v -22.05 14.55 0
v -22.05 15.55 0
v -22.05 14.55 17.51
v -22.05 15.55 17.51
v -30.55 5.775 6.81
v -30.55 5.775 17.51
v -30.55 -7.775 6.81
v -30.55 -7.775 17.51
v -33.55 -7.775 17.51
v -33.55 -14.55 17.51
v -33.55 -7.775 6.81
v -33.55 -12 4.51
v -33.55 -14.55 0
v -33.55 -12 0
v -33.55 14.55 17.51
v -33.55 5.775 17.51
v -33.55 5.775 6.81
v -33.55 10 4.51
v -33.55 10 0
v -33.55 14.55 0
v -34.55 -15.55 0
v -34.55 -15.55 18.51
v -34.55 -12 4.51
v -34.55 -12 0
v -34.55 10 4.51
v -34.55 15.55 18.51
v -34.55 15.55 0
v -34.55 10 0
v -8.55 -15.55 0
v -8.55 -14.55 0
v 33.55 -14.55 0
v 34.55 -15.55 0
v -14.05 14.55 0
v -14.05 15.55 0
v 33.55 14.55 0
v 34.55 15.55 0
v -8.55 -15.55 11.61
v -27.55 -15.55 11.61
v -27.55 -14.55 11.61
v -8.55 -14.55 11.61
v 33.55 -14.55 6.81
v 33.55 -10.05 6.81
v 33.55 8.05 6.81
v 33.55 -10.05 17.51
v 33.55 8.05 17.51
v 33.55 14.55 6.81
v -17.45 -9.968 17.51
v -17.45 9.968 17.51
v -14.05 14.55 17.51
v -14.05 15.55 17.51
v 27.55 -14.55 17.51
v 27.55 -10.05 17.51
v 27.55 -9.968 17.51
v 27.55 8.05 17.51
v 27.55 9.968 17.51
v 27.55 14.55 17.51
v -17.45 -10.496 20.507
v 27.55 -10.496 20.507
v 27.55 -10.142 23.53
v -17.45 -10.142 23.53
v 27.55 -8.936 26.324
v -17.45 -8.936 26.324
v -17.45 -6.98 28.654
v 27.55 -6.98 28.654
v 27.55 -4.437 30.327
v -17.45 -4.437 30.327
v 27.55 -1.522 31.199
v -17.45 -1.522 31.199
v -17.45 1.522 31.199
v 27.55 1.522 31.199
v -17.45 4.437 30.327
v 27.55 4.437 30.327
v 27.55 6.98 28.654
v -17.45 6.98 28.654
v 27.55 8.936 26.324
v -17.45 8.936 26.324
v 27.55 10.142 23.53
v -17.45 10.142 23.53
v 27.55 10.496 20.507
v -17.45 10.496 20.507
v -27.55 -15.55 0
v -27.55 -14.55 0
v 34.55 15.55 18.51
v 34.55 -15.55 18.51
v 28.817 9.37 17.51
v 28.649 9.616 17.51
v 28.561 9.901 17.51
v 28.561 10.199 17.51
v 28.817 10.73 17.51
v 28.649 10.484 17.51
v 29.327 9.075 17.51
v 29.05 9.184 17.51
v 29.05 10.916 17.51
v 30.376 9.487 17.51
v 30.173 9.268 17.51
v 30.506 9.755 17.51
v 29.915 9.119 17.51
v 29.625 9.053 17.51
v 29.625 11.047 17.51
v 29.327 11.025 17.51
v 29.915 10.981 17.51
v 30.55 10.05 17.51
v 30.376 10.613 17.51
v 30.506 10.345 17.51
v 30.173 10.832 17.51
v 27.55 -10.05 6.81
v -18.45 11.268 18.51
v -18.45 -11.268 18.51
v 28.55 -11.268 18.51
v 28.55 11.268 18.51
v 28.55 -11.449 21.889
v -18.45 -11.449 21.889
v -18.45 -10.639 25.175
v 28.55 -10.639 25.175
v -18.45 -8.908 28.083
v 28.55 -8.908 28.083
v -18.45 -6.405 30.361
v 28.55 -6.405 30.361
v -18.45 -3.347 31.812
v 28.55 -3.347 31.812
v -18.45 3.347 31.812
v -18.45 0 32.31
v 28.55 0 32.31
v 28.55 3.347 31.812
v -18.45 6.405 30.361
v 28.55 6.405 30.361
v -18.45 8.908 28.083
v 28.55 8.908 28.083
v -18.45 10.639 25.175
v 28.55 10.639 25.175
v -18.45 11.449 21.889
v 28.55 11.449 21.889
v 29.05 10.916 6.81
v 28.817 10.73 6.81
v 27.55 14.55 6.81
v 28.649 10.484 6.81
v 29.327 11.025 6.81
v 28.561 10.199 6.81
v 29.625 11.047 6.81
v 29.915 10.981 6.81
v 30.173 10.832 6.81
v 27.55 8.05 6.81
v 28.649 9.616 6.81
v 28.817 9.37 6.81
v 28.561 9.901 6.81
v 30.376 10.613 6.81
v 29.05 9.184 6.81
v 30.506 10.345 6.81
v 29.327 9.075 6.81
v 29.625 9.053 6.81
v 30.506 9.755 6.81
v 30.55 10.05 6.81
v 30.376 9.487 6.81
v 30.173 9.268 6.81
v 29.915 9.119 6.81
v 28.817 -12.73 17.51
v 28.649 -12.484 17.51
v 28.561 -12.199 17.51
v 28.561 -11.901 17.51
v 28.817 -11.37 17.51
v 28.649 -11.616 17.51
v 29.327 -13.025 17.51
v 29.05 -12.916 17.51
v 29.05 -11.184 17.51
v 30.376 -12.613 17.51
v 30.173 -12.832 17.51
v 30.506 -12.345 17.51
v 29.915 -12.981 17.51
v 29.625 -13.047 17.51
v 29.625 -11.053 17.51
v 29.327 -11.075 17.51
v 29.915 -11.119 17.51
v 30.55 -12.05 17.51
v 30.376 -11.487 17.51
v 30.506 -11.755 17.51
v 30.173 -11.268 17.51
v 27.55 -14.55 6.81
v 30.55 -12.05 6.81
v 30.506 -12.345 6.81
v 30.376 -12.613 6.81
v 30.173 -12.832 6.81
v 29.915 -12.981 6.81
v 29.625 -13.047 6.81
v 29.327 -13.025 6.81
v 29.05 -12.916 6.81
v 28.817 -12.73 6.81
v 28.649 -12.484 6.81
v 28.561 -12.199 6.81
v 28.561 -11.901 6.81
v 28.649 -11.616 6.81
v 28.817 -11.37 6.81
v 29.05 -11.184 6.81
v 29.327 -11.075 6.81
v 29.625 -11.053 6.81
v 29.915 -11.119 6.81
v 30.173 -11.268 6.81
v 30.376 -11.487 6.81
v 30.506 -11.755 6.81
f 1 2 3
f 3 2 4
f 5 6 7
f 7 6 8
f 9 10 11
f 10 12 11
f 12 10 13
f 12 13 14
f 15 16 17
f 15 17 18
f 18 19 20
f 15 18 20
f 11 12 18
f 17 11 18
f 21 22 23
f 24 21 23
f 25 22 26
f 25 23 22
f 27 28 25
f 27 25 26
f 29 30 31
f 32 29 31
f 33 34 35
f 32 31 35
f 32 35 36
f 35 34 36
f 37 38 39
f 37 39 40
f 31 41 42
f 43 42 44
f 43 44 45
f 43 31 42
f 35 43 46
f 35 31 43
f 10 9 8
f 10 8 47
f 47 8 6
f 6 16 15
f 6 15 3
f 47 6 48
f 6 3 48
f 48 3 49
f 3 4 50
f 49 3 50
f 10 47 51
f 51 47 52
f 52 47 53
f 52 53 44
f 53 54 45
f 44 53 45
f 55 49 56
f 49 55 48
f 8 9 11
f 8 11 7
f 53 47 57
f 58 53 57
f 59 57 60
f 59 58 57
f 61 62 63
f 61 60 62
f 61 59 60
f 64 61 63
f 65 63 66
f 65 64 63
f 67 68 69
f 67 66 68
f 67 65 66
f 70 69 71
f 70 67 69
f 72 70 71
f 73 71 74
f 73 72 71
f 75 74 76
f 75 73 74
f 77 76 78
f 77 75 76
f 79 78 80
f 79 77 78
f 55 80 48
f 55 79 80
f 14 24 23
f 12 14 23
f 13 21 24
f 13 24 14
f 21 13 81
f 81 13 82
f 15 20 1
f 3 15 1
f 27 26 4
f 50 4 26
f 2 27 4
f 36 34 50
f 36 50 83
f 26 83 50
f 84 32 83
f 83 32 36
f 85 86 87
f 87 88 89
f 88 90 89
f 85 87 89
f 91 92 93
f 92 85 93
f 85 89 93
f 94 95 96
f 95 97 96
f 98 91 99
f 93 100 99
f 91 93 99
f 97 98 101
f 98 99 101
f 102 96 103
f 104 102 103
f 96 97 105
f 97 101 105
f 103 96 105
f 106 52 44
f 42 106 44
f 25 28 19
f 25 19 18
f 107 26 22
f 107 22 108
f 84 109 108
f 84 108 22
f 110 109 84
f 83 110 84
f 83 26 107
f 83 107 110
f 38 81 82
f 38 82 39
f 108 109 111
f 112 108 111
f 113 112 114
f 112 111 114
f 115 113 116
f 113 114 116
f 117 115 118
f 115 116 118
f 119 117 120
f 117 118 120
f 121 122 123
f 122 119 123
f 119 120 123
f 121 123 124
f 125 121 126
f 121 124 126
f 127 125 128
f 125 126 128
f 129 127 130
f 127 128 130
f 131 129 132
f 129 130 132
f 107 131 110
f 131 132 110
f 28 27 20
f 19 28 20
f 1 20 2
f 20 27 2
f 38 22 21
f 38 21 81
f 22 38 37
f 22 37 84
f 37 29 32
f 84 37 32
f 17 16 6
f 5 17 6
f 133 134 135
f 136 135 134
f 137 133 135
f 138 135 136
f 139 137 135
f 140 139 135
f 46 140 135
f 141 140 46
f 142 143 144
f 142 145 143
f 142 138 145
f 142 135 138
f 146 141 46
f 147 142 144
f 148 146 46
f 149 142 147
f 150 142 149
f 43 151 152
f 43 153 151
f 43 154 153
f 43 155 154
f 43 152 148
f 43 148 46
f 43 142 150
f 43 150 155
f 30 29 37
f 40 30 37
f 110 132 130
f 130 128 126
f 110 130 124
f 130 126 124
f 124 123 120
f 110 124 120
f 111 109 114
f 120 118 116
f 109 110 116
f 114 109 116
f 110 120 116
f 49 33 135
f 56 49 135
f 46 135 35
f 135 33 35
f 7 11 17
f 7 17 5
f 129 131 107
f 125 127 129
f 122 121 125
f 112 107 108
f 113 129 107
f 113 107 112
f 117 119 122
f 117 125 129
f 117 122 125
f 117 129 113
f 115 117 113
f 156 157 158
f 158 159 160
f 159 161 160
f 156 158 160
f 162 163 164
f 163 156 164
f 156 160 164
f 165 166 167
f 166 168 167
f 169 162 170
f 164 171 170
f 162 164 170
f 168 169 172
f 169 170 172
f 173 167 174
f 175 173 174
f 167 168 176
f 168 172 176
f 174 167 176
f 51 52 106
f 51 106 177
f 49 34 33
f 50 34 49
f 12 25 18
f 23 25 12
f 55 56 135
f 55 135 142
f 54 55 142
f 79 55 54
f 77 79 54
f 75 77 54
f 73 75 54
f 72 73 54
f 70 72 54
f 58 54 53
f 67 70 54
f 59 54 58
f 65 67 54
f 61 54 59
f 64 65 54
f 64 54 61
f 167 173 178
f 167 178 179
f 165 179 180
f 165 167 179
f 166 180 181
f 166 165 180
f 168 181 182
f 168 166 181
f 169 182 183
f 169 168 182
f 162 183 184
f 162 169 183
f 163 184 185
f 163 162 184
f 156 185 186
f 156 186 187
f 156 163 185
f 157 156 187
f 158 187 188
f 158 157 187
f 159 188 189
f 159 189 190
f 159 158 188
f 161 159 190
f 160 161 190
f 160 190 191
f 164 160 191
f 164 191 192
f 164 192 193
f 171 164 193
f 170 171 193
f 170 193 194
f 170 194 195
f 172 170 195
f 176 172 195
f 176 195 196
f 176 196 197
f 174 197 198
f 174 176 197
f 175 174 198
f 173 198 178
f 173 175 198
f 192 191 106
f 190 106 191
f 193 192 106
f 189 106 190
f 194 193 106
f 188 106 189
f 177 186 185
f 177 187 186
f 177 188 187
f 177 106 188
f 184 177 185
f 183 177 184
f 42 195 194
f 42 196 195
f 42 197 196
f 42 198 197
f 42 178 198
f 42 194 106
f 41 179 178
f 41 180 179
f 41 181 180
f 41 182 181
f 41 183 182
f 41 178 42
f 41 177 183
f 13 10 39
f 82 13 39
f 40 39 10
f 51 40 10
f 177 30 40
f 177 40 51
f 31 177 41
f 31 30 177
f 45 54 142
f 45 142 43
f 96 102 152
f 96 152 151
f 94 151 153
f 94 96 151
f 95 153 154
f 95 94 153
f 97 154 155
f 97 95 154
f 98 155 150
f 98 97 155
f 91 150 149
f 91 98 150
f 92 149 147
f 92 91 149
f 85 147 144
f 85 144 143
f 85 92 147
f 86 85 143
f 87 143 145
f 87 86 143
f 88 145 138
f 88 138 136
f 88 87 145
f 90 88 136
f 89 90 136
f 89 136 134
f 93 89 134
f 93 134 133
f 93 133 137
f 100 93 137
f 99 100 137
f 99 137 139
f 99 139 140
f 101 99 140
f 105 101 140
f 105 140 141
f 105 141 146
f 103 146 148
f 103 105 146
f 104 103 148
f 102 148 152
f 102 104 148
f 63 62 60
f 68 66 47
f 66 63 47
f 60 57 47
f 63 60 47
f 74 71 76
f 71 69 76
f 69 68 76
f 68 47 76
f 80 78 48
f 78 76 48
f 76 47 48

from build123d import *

# Parameters (mm, degrees)
SKETCH001_W       = 69.1
SKETCH001_H       = 31.1
PAD_DEPTH         = 18.51
CYLINDER_R        = 11.5
CYLINDER_DEPTH    = 47
CYLINDER001_R     = 10.5
CYLINDER001_DEPTH = 45
BOX_W             = 67.1
BOX_H             = 29.1
BOX_DEPTH         = 17.51
SKETCH003_W       = 6
SKETCH003_H       = 4.5
SKETCH003_R       = 1
SKETCH003_H_2     = 6.5
PAD001_DEPTH      = 10.7
SKETCH004_W       = 8
SKETCH004_H       = 17.51
POCKET_DEPTH      = 5
SKETCH005_W       = 3
SKETCH005_H       = 13.55
PAD002_DEPTH      = 10.7
SKETCH006_W       = 19
SKETCH006_H       = 11.61
POCKET001_DEPTH   = 5
SKETCH007_W       = 22
SKETCH007_H       = 4.51
POCKET002_DEPTH   = 5


with BuildPart() as part:
    # Sketch001 → Pad (new body)
    with BuildSketch(Plane.XY):
        Rectangle(SKETCH001_W, SKETCH001_H)
    extrude(amount=PAD_DEPTH)

    # Cylinder → Cylinder (join)
    with BuildSketch(Plane(origin=(28.55, 0, 20.81), x_dir=(0, -1, 0), z_dir=(-1, 0, 0))):
        Circle(CYLINDER_R)
    extrude(amount=CYLINDER_DEPTH)

    # Cylinder001 → Cylinder001 (cut)
    with BuildSketch(Plane(origin=(27.55, 0, 20.81), x_dir=(0, 1, 0), z_dir=(-1, 0, 0))):
        Circle(CYLINDER001_R)
    extrude(amount=CYLINDER001_DEPTH, mode=Mode.SUBTRACT)

    # Box → Box (cut)
    with BuildSketch(Plane(origin=(-33.55, -14.55, 0), x_dir=(1, 0, 0), z_dir=(0, 0, 1))):
        with Locations((33.55, 14.55)):
            Rectangle(BOX_W, BOX_H)
    extrude(amount=BOX_DEPTH, mode=Mode.SUBTRACT)

    # Sketch003 (on Face15 of Box) → Pad001 (join)
    with BuildSketch(Plane(origin=(-33.55, -14.55, 17.51), x_dir=(1, 0, 0), z_dir=(0, 0, -1))):
        with Locations((64.1, -2.25)):
            Rectangle(SKETCH003_W, SKETCH003_H)
        with Locations((63.1, -2.5)):
            Circle(SKETCH003_R, mode=Mode.SUBTRACT)
        with Locations((64.1, -25.85)):
            Rectangle(SKETCH003_W, SKETCH003_H_2)
        with Locations((63.1, -24.6)):
            Circle(SKETCH003_R, mode=Mode.SUBTRACT)
    extrude(amount=PAD001_DEPTH)

    # Sketch004 (on Face2 of Pad001) → Pocket (cut)
    with BuildSketch(Plane(origin=(-33.55, 15.55, 0), x_dir=(-1, 0, 0), z_dir=(0, 1, 0))):
        with Locations((-15.5, 8.755)):
            Rectangle(SKETCH004_W, SKETCH004_H)
    extrude(amount=-POCKET_DEPTH, mode=Mode.SUBTRACT)

    # Sketch005 (on Face20 of Pocket) → Pad002 (join)
    with BuildSketch(Plane(origin=(-33.55, -14.55, 17.51), x_dir=(1, 0, 0), z_dir=(0, 0, -1))):
        with Locations((1.5, -13.55)):
            Rectangle(SKETCH005_W, SKETCH005_H)
    extrude(amount=PAD002_DEPTH)

    # Sketch006 (on Face3 of Pad002) → Pocket001 (cut)
    with BuildSketch(Plane(origin=(-33.55, -15.55, 0), x_dir=(1, 0, 0), z_dir=(0, -1, 0))):
        with Locations((15.5, 5.805)):
            Rectangle(SKETCH006_W, SKETCH006_H)
    extrude(amount=-POCKET001_DEPTH, mode=Mode.SUBTRACT)

    # Sketch007 (on Face1 of Pocket001) → Pocket002 (cut)
    with BuildSketch(Plane(origin=(-34.55, -14.55, 0), x_dir=(0, -1, 0), z_dir=(-1, 0, 0))):
        with Locations((-13.55, 2.255)):
            Rectangle(SKETCH007_W, SKETCH007_H)
    extrude(amount=-POCKET002_DEPTH, mode=Mode.SUBTRACT)


solid = part.part
